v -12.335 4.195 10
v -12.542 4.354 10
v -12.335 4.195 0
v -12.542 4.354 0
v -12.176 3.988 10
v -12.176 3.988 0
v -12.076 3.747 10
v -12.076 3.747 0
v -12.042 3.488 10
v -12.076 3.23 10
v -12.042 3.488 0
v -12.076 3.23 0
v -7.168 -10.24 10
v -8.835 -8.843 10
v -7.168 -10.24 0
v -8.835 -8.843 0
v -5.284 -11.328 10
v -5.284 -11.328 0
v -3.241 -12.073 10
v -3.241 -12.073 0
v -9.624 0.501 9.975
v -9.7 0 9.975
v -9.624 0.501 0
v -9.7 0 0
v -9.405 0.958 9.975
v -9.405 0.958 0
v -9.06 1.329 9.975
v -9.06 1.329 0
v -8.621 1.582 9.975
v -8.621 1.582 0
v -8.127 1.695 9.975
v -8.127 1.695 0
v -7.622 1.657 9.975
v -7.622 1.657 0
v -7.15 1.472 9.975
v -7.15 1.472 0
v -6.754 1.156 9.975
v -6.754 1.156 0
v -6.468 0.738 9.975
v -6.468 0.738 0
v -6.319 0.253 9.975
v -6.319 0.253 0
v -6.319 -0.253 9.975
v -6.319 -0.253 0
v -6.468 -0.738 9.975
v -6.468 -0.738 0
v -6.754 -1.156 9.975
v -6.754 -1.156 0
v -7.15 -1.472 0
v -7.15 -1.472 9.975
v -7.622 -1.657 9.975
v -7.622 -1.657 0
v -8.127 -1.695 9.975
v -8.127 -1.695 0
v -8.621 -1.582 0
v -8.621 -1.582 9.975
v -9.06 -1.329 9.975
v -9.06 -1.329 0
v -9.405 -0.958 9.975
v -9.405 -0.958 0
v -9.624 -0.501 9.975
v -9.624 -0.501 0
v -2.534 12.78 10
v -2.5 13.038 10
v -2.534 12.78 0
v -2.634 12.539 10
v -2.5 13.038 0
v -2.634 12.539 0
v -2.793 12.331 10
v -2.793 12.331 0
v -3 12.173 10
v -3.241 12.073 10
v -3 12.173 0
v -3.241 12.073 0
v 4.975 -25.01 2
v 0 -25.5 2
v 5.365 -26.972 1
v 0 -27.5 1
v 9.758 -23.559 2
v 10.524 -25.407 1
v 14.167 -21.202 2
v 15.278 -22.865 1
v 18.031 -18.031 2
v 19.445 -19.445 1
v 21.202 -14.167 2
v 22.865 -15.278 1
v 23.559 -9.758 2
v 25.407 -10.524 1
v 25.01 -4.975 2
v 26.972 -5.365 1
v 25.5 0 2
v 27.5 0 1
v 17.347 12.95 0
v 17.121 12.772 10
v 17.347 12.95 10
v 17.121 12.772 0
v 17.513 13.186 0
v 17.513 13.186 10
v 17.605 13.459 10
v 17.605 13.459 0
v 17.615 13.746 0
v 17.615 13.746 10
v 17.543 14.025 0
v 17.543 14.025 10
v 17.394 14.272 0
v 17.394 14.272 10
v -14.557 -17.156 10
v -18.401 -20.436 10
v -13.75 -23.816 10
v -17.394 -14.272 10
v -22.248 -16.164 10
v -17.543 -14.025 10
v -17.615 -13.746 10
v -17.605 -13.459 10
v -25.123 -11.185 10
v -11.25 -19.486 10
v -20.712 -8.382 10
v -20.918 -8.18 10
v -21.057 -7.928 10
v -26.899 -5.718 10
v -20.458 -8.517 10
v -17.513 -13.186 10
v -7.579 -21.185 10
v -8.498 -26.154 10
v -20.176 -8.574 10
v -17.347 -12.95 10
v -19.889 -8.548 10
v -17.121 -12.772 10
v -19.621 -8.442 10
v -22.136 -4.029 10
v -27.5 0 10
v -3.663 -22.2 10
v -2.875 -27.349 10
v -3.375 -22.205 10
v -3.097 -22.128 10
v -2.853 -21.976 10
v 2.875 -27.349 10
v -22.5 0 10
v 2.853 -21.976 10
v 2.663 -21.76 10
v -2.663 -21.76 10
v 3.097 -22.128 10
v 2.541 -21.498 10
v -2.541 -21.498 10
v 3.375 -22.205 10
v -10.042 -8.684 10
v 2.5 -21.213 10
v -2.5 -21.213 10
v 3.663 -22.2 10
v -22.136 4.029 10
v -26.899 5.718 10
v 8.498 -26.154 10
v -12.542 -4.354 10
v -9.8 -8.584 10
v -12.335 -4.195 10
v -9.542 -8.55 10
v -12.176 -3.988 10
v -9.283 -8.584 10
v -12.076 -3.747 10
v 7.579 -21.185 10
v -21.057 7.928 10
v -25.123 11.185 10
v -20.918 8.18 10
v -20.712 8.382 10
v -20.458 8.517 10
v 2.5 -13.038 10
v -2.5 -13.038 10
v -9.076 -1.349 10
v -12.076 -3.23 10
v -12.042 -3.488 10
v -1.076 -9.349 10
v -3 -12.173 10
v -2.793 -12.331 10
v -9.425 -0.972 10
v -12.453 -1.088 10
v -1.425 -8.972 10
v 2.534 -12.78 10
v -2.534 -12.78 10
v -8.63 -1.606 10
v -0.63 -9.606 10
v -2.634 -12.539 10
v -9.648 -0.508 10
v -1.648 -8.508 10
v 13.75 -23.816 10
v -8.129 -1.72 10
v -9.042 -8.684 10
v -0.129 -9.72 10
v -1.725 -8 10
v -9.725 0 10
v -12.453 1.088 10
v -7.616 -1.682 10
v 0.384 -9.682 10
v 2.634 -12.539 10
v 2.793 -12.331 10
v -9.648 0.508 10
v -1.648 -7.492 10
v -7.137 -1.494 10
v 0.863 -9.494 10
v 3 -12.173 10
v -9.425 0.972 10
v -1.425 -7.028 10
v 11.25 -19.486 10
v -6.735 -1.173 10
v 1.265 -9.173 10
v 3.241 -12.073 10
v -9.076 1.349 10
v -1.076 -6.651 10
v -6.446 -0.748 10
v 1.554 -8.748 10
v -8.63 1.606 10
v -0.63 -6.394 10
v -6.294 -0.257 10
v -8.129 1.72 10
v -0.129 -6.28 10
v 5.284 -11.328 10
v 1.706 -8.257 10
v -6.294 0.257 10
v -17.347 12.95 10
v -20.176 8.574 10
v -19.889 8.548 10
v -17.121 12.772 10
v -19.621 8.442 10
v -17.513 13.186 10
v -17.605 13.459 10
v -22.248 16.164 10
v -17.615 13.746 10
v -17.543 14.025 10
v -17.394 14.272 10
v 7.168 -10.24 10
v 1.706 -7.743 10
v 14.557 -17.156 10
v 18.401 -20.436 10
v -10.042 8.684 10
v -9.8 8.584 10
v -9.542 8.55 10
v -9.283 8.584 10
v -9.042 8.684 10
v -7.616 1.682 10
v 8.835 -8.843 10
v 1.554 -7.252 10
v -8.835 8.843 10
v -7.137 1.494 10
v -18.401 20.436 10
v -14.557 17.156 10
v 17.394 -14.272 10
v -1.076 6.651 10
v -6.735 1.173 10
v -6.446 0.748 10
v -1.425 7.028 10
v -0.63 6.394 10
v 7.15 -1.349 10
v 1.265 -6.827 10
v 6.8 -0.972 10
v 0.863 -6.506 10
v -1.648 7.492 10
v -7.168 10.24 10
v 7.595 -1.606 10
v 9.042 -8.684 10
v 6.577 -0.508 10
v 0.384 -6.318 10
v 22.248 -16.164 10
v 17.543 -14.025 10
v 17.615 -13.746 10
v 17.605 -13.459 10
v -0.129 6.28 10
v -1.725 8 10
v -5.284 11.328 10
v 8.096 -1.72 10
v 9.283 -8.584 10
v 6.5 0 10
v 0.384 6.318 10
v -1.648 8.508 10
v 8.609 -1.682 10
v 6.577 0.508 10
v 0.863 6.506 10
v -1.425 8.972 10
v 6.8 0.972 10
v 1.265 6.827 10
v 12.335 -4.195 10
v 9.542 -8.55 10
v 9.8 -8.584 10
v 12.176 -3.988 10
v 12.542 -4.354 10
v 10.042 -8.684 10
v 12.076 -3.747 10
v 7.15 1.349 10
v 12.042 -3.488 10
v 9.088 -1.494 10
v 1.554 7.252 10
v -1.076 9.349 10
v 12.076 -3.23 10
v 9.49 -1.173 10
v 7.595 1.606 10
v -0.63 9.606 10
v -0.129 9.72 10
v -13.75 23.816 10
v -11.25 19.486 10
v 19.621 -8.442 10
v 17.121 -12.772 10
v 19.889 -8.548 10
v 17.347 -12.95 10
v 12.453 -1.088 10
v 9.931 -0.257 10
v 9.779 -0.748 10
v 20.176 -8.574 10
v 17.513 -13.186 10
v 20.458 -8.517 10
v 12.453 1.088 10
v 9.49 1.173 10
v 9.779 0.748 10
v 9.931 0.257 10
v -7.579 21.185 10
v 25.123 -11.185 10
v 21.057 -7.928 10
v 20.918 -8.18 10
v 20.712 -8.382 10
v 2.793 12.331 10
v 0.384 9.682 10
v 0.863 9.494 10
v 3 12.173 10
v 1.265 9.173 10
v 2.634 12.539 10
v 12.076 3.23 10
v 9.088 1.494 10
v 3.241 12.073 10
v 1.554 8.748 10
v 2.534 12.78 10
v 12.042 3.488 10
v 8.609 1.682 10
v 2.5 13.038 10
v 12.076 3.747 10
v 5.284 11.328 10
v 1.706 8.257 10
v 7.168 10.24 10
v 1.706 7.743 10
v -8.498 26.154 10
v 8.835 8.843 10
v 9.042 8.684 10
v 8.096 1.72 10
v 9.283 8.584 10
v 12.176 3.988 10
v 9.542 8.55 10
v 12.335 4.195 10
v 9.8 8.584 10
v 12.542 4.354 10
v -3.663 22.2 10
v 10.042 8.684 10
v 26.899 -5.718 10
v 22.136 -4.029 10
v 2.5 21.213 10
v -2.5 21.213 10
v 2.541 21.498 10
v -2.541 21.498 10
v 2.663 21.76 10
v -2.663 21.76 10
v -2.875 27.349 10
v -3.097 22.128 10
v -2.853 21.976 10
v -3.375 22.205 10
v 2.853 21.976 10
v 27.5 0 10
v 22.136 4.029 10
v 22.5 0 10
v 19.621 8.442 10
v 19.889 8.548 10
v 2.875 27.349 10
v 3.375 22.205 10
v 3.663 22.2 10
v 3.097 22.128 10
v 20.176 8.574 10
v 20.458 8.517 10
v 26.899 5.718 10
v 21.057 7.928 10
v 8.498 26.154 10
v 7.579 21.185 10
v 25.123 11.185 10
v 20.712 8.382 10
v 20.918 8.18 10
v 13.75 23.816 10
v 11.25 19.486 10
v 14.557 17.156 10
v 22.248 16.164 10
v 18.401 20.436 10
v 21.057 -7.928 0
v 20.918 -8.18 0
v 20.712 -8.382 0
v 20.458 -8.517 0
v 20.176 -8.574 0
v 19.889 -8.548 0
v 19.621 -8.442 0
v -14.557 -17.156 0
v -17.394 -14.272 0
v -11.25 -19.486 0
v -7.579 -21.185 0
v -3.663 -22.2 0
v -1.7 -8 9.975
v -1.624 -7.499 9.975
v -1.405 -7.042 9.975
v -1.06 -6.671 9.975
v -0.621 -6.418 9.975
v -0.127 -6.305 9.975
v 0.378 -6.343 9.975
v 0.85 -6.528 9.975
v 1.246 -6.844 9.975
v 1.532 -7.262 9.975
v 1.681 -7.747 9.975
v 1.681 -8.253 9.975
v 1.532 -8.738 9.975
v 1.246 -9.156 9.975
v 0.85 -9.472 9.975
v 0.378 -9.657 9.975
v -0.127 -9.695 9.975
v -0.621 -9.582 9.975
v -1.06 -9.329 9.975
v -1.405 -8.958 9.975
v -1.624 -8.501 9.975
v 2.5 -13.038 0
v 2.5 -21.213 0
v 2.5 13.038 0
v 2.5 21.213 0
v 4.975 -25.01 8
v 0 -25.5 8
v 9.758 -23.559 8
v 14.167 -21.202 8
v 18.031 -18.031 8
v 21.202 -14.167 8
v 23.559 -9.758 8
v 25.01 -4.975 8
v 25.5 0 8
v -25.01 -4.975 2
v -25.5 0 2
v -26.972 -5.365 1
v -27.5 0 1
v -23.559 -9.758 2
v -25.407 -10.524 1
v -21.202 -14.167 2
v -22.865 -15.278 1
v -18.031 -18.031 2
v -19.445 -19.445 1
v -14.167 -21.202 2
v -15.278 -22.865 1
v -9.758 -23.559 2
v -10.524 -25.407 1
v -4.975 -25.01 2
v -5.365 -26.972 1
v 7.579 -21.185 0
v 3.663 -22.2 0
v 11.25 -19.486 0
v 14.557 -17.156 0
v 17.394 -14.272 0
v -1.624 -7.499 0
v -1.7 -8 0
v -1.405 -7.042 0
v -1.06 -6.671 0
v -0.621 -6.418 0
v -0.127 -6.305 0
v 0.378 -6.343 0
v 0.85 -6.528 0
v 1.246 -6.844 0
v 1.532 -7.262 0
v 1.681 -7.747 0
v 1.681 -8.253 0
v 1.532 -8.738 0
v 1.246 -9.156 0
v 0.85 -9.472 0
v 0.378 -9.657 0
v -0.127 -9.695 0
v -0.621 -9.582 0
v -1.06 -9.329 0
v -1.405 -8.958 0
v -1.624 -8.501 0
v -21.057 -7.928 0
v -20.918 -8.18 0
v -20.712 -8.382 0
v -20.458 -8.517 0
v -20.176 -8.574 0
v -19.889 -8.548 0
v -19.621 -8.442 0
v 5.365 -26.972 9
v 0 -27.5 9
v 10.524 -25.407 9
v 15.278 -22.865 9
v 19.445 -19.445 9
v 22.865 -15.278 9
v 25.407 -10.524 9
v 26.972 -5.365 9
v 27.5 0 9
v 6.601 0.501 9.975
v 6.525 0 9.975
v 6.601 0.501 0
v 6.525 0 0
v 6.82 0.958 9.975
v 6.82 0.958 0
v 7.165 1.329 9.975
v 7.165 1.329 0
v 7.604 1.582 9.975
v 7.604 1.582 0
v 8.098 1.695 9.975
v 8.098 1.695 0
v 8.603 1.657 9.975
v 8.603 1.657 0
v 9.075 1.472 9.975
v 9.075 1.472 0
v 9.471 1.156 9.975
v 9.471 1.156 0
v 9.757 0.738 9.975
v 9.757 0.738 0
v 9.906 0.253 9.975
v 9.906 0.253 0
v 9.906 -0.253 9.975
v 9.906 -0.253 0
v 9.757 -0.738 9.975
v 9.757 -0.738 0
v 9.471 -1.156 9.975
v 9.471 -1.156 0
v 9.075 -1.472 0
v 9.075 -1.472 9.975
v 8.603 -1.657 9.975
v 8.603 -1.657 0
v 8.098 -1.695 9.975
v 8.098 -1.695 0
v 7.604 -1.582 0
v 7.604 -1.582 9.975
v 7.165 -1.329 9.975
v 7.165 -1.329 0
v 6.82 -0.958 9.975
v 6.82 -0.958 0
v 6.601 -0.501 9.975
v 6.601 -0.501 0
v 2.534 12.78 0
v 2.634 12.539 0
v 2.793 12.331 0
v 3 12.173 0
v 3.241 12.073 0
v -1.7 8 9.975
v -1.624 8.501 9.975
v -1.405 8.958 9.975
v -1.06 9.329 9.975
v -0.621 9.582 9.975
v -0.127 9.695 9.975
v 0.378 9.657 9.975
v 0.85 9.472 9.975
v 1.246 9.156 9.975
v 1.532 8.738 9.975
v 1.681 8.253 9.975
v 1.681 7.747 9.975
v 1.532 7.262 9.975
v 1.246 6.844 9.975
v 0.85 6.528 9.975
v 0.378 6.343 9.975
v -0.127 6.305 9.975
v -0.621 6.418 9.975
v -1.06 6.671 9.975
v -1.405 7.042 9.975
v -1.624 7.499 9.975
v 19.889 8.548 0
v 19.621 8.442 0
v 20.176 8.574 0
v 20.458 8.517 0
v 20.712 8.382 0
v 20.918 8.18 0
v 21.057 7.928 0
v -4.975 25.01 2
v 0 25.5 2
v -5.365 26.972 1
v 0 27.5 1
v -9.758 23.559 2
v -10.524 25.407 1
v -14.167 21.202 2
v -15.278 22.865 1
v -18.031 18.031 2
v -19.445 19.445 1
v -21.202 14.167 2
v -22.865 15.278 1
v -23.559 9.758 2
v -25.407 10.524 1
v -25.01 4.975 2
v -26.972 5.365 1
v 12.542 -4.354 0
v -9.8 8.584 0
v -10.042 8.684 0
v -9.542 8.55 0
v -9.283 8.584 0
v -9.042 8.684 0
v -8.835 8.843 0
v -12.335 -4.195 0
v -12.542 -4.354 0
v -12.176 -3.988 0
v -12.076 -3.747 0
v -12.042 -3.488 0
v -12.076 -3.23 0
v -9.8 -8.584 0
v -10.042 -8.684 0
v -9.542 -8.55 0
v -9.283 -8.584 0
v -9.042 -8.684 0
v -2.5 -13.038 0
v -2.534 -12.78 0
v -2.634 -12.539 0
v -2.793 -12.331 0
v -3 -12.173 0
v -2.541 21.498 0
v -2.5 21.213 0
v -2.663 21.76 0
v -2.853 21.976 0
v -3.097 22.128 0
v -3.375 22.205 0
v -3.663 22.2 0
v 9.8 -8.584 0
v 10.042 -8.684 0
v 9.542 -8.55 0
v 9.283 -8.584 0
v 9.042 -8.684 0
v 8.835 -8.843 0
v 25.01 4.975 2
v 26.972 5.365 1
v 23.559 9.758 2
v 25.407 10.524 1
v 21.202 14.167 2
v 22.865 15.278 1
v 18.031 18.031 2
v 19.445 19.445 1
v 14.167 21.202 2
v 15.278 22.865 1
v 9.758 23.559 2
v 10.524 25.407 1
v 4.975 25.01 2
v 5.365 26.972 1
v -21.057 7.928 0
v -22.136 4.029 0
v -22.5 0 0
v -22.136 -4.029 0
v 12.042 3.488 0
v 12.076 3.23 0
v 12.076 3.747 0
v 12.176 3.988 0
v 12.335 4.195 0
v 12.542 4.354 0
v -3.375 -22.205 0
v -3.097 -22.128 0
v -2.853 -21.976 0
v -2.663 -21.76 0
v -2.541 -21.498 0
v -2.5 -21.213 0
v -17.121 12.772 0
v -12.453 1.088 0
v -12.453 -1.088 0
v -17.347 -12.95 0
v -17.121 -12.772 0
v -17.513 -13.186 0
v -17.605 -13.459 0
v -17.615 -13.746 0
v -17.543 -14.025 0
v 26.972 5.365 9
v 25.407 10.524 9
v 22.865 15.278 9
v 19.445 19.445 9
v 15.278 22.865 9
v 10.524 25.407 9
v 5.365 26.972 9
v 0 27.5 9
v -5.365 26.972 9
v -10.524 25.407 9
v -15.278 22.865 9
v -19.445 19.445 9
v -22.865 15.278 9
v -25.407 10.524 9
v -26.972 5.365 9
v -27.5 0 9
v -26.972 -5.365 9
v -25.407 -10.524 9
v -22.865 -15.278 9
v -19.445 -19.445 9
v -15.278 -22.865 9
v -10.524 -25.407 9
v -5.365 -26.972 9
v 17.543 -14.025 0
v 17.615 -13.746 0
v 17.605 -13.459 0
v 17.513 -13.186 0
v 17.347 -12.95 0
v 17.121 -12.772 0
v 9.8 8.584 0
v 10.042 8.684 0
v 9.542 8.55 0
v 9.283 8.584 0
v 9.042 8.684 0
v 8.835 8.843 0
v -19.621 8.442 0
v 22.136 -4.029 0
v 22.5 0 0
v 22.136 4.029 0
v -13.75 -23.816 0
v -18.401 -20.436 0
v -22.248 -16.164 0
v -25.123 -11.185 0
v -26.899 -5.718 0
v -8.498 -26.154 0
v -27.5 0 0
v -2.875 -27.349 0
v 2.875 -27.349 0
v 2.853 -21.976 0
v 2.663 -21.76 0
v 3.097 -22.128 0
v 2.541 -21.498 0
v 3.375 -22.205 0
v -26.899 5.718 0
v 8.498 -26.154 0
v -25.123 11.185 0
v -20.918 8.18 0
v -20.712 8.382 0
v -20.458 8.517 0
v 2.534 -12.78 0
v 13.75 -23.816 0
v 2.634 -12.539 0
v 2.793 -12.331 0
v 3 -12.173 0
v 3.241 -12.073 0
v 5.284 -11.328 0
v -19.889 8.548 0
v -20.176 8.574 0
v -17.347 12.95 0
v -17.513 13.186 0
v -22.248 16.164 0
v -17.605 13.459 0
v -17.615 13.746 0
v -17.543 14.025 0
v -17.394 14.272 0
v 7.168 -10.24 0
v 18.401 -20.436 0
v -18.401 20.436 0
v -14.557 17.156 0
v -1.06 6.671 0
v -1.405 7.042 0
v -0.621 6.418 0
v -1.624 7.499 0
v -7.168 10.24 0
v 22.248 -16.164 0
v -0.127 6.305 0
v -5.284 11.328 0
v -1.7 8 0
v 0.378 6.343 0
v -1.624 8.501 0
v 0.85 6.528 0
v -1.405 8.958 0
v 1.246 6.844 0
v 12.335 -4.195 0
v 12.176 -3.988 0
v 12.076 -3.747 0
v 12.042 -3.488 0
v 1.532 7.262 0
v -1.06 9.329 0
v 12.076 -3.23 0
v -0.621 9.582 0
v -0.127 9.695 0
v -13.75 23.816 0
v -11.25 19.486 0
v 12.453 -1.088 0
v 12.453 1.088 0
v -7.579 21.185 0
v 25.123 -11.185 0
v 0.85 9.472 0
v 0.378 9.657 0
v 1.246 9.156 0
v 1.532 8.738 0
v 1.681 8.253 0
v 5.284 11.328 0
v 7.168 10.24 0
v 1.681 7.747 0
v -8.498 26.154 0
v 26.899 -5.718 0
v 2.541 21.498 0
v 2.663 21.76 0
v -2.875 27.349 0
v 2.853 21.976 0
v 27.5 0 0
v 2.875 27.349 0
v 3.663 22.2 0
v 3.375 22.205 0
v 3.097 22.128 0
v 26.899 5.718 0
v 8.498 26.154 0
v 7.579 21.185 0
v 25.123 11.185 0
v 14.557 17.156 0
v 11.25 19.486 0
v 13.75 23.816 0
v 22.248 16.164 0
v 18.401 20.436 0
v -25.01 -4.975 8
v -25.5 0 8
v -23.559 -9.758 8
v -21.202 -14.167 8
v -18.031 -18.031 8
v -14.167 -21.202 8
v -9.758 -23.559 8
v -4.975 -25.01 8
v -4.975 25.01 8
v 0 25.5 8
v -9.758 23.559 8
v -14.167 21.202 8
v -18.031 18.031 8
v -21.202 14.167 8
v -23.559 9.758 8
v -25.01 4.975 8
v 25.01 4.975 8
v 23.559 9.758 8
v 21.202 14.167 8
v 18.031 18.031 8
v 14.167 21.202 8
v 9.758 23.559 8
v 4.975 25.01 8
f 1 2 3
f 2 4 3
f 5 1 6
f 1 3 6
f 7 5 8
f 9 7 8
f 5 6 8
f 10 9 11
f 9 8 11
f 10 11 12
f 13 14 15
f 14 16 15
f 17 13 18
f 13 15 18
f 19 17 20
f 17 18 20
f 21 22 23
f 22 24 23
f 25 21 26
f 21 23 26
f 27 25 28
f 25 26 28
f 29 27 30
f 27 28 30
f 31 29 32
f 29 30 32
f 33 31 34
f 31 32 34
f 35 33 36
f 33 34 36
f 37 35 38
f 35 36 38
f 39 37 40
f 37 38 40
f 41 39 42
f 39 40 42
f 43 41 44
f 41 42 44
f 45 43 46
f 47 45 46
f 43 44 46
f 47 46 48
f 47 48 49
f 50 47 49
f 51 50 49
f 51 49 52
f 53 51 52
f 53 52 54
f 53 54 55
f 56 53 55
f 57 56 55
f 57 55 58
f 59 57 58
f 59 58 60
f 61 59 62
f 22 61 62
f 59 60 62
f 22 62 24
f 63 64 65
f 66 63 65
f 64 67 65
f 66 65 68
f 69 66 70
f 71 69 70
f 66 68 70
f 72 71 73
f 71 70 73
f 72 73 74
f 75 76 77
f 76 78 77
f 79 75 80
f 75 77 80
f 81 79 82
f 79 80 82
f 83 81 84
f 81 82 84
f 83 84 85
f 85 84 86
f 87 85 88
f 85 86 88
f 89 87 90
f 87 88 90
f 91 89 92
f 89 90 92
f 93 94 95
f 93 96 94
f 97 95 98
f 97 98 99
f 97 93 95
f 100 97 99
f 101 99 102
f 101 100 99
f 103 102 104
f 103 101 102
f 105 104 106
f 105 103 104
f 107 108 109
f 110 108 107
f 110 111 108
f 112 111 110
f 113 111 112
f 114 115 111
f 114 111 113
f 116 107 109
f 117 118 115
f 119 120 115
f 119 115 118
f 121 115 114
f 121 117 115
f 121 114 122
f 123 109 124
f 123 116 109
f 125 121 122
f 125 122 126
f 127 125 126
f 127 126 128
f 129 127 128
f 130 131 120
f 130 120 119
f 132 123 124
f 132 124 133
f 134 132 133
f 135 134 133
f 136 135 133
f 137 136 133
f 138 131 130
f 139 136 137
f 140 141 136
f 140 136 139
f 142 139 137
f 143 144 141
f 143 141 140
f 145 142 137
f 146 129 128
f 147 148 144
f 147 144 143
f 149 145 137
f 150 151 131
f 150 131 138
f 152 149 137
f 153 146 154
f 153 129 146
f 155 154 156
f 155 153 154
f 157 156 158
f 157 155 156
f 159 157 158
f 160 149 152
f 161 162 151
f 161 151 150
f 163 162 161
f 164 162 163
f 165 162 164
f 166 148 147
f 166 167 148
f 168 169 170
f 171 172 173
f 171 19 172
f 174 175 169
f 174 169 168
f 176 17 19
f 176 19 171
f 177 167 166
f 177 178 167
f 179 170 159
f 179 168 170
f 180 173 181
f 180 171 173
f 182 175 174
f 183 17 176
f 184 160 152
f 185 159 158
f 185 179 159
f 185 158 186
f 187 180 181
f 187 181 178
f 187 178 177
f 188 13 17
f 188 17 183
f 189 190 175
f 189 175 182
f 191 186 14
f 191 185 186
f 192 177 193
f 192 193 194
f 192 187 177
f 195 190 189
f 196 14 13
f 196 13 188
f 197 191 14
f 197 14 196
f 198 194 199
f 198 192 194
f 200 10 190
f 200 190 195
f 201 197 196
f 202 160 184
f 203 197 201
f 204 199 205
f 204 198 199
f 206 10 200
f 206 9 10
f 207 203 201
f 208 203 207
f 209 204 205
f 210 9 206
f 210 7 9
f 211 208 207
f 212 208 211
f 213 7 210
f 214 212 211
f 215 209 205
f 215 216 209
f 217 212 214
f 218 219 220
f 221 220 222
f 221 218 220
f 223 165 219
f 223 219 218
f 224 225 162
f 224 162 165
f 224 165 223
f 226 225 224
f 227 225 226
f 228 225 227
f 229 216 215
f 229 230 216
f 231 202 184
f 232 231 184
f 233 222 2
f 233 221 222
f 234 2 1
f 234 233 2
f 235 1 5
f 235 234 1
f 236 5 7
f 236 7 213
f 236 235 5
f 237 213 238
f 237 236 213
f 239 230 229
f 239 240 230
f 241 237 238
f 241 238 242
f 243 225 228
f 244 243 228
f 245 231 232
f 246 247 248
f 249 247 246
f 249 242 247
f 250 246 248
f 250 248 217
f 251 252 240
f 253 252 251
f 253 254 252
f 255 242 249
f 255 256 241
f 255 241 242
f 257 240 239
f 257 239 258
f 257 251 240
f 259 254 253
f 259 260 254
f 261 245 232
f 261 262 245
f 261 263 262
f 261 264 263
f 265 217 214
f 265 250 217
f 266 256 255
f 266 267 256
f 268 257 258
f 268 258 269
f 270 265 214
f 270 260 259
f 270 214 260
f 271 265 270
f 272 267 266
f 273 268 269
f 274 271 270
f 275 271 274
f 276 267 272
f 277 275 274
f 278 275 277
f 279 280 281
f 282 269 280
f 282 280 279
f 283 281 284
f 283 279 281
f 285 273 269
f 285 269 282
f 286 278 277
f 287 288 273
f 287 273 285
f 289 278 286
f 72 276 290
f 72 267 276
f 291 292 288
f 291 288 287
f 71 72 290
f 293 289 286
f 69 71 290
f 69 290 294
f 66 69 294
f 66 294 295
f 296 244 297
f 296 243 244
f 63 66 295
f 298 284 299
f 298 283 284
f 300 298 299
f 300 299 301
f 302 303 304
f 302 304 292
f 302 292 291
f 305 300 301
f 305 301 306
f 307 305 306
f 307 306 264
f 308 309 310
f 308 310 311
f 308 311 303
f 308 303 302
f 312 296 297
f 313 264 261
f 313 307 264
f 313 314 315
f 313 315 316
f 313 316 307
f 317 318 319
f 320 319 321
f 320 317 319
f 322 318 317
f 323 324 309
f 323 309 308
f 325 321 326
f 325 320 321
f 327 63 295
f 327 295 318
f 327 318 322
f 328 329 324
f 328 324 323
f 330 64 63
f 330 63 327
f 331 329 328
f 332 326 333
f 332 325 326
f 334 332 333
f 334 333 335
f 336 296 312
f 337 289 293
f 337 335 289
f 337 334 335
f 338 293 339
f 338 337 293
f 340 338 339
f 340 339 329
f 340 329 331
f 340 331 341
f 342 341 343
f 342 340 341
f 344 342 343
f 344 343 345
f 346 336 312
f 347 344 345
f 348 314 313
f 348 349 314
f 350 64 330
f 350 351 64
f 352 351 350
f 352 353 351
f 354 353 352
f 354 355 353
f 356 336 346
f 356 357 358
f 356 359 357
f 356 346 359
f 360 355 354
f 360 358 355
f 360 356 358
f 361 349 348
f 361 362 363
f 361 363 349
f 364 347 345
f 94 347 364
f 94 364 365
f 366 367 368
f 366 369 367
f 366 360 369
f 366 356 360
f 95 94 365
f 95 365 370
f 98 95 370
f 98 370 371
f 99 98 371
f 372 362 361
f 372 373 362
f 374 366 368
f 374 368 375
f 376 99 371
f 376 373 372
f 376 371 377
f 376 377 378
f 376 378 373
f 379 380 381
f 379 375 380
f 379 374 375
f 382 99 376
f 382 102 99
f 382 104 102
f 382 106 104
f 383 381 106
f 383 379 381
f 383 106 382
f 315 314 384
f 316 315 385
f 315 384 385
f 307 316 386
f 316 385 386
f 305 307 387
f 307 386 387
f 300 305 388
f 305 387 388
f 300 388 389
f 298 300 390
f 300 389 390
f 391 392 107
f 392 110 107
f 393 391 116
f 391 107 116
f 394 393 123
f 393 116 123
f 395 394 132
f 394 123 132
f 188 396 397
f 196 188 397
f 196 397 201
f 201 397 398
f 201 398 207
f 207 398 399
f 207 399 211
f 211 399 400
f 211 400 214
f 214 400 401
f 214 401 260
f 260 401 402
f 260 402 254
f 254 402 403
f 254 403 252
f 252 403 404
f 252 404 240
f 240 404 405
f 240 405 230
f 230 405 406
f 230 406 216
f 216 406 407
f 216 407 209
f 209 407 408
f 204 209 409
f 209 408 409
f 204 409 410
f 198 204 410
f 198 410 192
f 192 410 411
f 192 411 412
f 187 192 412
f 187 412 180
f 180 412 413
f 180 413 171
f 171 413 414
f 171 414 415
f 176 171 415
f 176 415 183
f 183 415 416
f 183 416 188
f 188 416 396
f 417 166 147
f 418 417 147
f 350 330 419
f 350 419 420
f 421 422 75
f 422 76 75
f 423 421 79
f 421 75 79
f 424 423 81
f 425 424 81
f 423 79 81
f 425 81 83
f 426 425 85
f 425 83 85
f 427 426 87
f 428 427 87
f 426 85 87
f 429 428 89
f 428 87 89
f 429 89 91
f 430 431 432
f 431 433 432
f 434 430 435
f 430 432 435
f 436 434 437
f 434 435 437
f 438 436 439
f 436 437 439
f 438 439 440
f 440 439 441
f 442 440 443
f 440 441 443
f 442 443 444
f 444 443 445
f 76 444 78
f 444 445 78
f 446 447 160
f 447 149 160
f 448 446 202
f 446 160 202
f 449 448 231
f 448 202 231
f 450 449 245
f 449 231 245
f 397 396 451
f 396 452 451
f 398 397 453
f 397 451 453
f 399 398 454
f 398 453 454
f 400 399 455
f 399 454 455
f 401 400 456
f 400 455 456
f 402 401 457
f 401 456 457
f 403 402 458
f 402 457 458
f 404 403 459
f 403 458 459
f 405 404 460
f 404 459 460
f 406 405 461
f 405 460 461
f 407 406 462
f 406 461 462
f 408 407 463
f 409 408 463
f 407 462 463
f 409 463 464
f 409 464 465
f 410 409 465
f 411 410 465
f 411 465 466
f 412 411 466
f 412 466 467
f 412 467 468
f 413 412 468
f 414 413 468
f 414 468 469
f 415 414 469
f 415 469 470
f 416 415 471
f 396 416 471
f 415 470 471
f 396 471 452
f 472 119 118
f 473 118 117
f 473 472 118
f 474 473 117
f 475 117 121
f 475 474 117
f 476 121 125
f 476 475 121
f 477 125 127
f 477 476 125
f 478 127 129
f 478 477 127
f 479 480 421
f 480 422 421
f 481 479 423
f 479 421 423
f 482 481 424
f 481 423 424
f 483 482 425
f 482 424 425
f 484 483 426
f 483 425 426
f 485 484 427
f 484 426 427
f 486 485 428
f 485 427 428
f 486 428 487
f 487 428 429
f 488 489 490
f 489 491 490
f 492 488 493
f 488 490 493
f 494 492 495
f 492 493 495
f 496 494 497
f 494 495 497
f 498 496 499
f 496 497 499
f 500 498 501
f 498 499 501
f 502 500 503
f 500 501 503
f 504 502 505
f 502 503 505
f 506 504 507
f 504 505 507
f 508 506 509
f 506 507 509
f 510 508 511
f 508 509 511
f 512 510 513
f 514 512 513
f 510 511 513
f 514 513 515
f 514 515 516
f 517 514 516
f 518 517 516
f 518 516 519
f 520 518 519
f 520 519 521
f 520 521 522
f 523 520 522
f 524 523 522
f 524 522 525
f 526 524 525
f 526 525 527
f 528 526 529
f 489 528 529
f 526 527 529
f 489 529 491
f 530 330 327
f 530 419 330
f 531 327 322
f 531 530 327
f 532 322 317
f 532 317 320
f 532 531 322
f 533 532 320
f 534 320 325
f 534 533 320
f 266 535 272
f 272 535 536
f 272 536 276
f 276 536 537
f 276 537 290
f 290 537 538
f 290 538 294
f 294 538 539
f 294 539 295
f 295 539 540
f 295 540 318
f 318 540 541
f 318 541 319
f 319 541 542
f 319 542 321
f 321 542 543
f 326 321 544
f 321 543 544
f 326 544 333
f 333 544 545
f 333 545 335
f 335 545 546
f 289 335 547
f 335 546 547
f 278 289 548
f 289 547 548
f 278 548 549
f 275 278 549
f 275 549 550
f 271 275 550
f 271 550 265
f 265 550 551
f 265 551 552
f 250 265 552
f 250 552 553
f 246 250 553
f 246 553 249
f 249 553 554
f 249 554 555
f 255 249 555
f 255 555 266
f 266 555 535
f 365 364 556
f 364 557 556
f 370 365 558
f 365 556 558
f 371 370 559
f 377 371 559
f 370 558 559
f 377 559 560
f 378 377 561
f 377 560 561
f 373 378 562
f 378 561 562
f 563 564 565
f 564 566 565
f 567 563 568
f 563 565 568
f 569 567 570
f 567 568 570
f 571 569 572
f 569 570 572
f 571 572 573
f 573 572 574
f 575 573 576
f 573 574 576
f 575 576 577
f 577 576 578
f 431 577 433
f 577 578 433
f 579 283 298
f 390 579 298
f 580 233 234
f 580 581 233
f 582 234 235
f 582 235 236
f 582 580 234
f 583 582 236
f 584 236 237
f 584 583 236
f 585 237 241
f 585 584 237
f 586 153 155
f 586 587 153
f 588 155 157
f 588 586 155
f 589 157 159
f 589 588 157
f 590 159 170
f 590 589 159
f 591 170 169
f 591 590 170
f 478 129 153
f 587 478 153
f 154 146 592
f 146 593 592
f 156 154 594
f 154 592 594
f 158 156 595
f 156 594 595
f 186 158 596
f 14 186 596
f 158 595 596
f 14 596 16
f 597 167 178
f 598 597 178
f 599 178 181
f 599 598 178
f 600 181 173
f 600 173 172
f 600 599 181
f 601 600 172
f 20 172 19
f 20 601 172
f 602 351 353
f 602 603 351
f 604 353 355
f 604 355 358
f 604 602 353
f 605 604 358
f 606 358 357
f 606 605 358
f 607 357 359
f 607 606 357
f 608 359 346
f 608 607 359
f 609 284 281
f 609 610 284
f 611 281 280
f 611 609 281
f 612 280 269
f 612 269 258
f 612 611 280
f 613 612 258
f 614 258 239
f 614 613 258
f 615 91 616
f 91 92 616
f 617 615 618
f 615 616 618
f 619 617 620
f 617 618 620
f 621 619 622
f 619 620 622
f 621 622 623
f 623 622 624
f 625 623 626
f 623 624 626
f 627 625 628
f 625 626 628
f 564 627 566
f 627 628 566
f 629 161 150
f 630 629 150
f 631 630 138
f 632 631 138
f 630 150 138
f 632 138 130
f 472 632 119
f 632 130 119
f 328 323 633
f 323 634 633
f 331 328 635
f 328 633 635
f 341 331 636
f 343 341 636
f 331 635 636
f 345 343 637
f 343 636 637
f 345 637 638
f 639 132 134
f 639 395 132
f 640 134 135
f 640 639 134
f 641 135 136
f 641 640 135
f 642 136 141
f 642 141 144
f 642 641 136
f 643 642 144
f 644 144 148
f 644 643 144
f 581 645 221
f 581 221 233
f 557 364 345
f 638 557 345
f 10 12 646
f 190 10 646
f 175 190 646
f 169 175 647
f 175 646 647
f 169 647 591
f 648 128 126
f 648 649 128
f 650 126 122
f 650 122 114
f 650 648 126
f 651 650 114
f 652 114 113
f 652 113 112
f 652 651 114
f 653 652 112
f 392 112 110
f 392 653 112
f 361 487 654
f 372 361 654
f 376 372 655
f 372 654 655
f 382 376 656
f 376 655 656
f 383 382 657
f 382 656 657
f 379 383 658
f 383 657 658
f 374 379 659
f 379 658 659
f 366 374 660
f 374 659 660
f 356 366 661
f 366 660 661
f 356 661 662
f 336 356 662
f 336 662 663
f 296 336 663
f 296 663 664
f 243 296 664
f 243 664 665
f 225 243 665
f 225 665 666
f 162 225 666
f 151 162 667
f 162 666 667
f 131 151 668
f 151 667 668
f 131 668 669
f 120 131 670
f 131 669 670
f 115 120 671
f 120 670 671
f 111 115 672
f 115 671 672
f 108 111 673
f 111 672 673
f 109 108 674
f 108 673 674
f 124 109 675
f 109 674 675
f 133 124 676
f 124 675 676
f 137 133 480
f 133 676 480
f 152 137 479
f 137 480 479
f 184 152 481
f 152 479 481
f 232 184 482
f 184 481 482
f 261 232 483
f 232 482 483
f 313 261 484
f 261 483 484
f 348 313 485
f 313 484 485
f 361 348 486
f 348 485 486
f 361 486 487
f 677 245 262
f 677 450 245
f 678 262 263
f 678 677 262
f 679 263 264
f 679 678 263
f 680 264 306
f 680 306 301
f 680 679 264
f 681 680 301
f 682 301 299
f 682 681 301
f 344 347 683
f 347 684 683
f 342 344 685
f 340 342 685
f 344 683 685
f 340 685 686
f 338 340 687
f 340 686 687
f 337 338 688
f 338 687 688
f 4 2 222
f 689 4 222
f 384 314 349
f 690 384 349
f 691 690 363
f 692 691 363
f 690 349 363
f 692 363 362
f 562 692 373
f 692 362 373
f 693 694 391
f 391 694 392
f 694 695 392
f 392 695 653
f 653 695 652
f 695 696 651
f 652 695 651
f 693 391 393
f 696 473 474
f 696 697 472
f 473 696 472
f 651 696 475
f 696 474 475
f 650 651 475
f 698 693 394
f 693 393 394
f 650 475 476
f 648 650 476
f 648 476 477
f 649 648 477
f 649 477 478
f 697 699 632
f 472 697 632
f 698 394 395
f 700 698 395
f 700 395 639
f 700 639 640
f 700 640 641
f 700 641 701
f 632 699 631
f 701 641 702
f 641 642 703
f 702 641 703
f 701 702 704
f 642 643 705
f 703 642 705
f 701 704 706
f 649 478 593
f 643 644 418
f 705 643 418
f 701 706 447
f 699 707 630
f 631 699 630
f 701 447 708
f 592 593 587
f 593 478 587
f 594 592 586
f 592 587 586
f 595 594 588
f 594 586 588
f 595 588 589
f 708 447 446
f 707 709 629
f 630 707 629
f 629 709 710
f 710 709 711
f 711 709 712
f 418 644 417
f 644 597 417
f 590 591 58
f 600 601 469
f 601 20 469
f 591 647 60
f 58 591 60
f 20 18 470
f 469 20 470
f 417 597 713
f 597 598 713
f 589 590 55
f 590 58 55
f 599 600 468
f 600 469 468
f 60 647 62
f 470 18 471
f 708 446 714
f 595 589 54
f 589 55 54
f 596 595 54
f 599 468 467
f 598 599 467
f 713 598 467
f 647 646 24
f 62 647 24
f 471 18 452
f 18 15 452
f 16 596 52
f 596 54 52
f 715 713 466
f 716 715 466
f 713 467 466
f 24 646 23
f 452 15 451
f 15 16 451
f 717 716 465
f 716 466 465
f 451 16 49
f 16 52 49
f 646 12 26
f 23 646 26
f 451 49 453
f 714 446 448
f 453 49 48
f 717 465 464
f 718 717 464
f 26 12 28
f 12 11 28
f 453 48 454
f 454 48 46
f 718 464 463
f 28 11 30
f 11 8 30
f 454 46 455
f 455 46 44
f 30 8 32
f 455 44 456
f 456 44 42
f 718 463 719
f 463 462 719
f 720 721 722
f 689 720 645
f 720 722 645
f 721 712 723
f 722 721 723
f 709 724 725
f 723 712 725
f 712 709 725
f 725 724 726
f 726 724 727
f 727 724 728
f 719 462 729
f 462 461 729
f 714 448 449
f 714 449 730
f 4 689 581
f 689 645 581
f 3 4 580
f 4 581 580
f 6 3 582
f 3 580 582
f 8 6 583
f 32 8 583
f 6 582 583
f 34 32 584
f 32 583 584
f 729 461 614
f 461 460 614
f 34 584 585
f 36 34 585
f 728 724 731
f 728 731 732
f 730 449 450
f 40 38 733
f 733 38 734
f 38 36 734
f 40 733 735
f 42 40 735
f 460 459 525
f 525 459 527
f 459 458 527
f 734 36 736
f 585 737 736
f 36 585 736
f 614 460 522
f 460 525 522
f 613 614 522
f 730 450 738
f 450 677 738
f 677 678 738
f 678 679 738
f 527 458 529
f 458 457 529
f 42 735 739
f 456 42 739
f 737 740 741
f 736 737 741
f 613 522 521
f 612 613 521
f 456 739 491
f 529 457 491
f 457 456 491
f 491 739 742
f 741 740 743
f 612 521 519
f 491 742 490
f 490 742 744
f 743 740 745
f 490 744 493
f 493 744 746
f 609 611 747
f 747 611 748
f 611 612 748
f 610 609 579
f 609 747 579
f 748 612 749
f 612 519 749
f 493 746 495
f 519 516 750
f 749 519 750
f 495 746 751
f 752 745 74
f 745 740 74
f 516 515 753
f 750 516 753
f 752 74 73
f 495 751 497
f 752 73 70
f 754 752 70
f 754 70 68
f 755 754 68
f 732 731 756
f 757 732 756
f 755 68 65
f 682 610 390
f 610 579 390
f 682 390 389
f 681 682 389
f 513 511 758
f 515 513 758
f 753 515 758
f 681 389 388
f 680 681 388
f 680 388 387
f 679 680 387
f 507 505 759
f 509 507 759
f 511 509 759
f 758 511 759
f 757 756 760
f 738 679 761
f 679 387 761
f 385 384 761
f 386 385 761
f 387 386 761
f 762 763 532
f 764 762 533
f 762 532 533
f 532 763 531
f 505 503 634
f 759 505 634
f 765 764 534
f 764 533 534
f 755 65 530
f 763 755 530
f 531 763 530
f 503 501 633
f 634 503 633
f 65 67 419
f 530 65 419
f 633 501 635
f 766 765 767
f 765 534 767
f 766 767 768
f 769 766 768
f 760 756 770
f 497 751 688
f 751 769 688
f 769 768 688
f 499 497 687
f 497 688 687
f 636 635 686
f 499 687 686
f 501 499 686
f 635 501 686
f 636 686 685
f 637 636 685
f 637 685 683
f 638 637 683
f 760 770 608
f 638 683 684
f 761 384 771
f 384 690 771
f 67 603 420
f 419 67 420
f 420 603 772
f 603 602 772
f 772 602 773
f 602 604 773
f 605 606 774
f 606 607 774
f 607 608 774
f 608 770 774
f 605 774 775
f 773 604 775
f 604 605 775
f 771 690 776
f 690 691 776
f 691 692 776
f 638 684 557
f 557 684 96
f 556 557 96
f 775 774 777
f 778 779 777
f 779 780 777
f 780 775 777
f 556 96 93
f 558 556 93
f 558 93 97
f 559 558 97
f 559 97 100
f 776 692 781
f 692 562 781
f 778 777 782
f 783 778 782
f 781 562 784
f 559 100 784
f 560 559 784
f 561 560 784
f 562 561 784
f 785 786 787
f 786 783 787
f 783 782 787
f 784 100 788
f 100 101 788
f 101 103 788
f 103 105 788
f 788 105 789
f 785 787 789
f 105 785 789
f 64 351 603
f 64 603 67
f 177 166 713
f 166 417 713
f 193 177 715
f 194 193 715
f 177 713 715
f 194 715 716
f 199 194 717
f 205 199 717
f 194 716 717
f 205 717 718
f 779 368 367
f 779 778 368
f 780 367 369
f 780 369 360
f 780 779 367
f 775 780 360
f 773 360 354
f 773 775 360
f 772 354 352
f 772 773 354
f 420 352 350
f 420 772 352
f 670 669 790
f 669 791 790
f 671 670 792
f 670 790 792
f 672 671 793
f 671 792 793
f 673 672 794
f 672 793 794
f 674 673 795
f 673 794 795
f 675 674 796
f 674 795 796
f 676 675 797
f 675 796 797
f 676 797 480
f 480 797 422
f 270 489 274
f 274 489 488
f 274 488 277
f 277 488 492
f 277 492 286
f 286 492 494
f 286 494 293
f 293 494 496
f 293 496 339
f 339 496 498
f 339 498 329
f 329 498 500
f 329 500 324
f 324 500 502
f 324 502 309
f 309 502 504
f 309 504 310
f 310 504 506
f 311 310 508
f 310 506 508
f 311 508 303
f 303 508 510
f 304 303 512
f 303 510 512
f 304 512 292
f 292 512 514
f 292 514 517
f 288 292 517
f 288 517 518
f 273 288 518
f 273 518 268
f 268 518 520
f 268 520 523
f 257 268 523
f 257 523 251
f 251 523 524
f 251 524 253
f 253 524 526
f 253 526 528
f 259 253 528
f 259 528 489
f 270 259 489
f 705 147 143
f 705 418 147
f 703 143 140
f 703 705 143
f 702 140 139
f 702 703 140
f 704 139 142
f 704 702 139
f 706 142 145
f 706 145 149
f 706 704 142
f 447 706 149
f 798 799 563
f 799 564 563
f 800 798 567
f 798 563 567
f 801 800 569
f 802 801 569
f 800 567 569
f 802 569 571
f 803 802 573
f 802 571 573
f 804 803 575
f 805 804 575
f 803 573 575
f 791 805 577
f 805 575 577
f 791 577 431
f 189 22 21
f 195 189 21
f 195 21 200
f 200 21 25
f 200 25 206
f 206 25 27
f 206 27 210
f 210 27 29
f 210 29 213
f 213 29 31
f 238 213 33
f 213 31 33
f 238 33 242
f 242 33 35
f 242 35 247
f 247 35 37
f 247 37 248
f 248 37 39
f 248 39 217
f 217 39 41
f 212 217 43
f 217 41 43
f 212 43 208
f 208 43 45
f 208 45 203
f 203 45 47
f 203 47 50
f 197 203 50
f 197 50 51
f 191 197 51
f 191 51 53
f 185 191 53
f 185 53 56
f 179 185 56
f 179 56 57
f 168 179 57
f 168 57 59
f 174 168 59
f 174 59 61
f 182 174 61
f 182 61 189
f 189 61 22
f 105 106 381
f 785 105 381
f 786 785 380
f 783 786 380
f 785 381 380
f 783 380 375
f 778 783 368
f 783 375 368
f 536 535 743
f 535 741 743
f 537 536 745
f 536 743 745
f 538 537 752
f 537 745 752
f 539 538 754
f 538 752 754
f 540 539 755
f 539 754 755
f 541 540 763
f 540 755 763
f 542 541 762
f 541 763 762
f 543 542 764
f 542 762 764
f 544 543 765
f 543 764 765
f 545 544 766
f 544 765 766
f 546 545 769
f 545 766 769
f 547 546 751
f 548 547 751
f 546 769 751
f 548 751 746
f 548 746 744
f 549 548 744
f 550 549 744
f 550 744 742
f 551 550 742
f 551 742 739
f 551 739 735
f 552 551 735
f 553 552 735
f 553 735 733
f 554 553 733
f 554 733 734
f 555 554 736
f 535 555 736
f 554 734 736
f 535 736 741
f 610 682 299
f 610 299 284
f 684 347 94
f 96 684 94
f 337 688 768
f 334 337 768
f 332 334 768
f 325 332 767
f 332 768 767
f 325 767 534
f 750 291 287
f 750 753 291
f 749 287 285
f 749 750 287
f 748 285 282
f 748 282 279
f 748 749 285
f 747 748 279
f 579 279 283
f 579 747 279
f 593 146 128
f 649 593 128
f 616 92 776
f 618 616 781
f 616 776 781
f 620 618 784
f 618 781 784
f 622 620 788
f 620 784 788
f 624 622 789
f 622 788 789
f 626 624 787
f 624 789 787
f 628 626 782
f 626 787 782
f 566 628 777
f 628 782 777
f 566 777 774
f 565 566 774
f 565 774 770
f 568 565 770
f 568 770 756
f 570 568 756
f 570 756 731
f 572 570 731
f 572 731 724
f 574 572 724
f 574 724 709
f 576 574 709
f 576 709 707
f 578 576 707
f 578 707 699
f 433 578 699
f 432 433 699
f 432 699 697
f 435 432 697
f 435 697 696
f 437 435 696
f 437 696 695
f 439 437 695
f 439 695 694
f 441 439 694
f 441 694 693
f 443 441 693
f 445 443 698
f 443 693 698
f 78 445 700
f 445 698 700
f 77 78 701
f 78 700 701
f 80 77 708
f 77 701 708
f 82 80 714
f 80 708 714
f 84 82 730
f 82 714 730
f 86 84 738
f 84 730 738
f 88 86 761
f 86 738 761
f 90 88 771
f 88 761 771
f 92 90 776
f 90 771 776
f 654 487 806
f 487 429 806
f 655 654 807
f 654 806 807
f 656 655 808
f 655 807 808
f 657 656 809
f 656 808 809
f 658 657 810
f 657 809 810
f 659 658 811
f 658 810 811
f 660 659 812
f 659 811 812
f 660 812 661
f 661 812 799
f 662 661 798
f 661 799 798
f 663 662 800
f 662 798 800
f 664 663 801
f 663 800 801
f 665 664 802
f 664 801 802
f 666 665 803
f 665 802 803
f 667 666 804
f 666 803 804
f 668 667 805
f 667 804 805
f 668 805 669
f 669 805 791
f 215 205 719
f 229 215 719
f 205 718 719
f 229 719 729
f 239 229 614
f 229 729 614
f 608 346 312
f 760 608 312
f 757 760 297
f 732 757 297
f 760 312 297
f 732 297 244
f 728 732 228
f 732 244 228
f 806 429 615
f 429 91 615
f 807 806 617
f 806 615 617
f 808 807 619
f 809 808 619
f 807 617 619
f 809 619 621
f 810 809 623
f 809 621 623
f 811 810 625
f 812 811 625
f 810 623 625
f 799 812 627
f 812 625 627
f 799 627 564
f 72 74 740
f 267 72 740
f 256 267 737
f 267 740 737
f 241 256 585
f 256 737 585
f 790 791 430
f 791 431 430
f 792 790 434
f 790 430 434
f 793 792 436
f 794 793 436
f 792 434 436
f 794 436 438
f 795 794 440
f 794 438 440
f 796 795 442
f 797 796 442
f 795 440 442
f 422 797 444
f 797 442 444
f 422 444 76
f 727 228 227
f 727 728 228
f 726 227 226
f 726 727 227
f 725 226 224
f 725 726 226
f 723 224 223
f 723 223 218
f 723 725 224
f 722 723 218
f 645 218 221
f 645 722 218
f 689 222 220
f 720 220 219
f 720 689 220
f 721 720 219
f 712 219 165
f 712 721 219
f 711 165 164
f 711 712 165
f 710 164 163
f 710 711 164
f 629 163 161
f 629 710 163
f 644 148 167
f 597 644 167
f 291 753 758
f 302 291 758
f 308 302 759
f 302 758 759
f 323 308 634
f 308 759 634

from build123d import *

# Parameters (mm, degrees)
SKETCH_1_R                  = 27.5
EXTRUDE_1_DEPTH             = 10
CUT_EXTRUDE_1_REACH         = 42.156
SKETCH_2_R                  = 22.5
SKETCH_3_R                  = 12.5
EXTRUDE_2_DEPTH             = 10
EXTRUDE_START               = 10
EXTRUDE_3_DEPTH             = 10
HOLE_WIZARD_M32_D           = 3.4
HOLE_WIZARD_M32_CSINK_D     = 3.45
HOLE_WIZARD_M32_CSINK_ANGLE = 90
FILLET_1_R                  = 1


with BuildPart() as part:
    # Эскиз1 → Бобышка-Вытянуть1 (new body)
    with BuildSketch(Plane.XY):
        Circle(SKETCH_1_R)
    extrude(amount=EXTRUDE_1_DEPTH)

    # Эскиз2 → Вырез-Вытянуть1 (cut, up to next)
    with BuildSketch(Plane.XY.offset(10), mode=Mode.PRIVATE) as cut_extrude_1_sk1:
        Circle(SKETCH_2_R)
    cut_extrude_1_tool1 = extrude(cut_extrude_1_sk1.sketch, amount=-CUT_EXTRUDE_1_REACH, mode=Mode.PRIVATE) & part.part
    add(cut_extrude_1_tool1.solids().sort_by_distance((0, 0, 10))[0], mode=Mode.SUBTRACT)



with BuildPart() as body_2:
    # Эскиз3 → Бобышка-Вытянуть2 (new body)
    with BuildSketch(Plane.XY):
        Circle(SKETCH_3_R)
    extrude(amount=EXTRUDE_2_DEPTH)


with BuildPart() as part_1:
    add(part.part)

    add(body_2.part)  # Бобышка-Вытянуть3 merges body 2
    # Эскиз5 → Бобышка-Вытянуть3 (add)
    with BuildSketch(Plane.XY.offset(EXTRUDE_START)):
        with BuildLine():
            Line((9.356601718, 8.288787866), (18.114916731, 13.345403397))
            ThreePointArc((18.114916731, 13.345403397), (19.485571585, 11.25), (20.614916731, 9.015276378))
            Line((20.614916731, 9.015276378), (11.856601718, 3.958660847))
            ThreePointArc((11.856601718, 3.958660847), (10.825317547, 6.25), (9.356601718, 8.288787866))
        make_face()
        with BuildLine():
            Line((2.5, 12.247448714), (2.5, 22.360679775))
            ThreePointArc((2.5, 22.360679775), (0, 22.5), (-2.5, 22.360679775))
            Line((-2.5, 22.360679775), (-2.5, 12.247448714))
            ThreePointArc((-2.5, 12.247448714), (0, 12.5), (2.5, 12.247448714))
        make_face()
        with BuildLine():
            Line((11.856601718, -3.958660847), (20.614916731, -9.015276378))
            ThreePointArc((20.614916731, -9.015276378), (19.485571585, -11.25), (18.114916731, -13.345403397))
            Line((18.114916731, -13.345403397), (9.356601718, -8.288787866))
            ThreePointArc((9.356601718, -8.288787866), (10.825317547, -6.25), (11.856601718, -3.958660847))
        make_face()
        with BuildLine():
            Line((2.5, -12.247448714), (2.5, -22.360679775))
            ThreePointArc((2.5, -22.360679775), (0, -22.5), (-2.5, -22.360679775))
            Line((-2.5, -22.360679775), (-2.5, -12.247448714))
            ThreePointArc((-2.5, -12.247448714), (0, -12.5), (2.5, -12.247448714))
        make_face()
        with BuildLine():
            Line((-9.356601718, -8.288787866), (-18.114916731, -13.345403397))
            ThreePointArc((-18.114916731, -13.345403397), (-19.485571585, -11.25), (-20.614916731, -9.015276378))
            Line((-20.614916731, -9.015276378), (-11.856601718, -3.958660847))
            ThreePointArc((-11.856601718, -3.958660847), (-10.825317547, -6.25), (-9.356601718, -8.288787866))
        make_face()
        with BuildLine():
            Line((-11.856601718, 3.958660847), (-20.614916731, 9.015276378))
            ThreePointArc((-20.614916731, 9.015276378), (-19.485571585, 11.25), (-18.114916731, 13.345403397))
            Line((-18.114916731, 13.345403397), (-9.356601718, 8.288787866))
            ThreePointArc((-9.356601718, 8.288787866), (-10.825317547, 6.25), (-11.856601718, 3.958660847))
        make_face()
    extrude(amount=-EXTRUDE_3_DEPTH)

    # Отверстие с зазором M32 (through all)
    with Locations(Plane.XY.offset(10)):
        with Locations((-8, 0), (0, 8), (8.225054206, 0), (0, -8)):
            CounterSinkHole(HOLE_WIZARD_M32_D / 2, HOLE_WIZARD_M32_CSINK_D / 2, counter_sink_angle=HOLE_WIZARD_M32_CSINK_ANGLE)

    # Скругление1
    fillet_1_edges = [part_1.edges().sort_by_distance(p)[0] for p in [
        (-2.5, 12.247448714, 5),
        (2.5, 12.247448714, 5),
        (2.5, 22.360679775, 5),
        (-2.5, 22.360679775, 5),
        (9.356601718, 8.288787866, 5),
        (11.856601718, 3.958660847, 5),
        (20.614916731, 9.015276378, 5),
        (18.114916731, 13.345403397, 5),
        (11.856601718, -3.958660847, 5),
        (9.356601718, -8.288787866, 5),
        (18.114916731, -13.345403397, 5),
        (20.614916731, -9.015276378, 5),
        (2.5, -12.247448714, 5),
        (-2.5, -12.247448714, 5),
        (-2.5, -22.360679775, 5),
        (2.5, -22.360679775, 5),
        (-9.356601718, -8.288787866, 5),
        (-11.856601718, -3.958660847, 5),
        (-20.614916731, -9.015276378, 5),
        (-18.114916731, -13.345403397, 5),
        (-11.856601718, 3.958660847, 5),
        (-9.356601718, 8.288787866, 5),
        (-18.114916731, 13.345403397, 5),
        (-20.614916731, 9.015276378, 5),
    ]]
    fillet(fillet_1_edges, radius=FILLET_1_R)

    # Вырез-По траектории2: sweep along a curve in space
    with BuildLine() as sweep_2_path:
        ThreePointArc((27.5, 0, 10), (19.445436483, 19.445436483, 10), (0, 27.5, 10))
        ThreePointArc((0, 27.5, 10), (-19.445436483, 19.445436483, 10), (-27.5, 0, 10))
        ThreePointArc((-27.5, 0, 10), (-19.445436483, -19.445436483, 10), (0, -27.5, 10))
        ThreePointArc((0, -27.5, 10), (19.445436483, -19.445436483, 10), (27.5, 0, 10))
    # Эскиз13 → Вырез-По траектории2 (sweep, cut)
    with BuildSketch(Plane(origin=(0, 0, 0), x_dir=(0, 0, -1), z_dir=(1, 0, 0))):
        Polygon((-8, 25.5), (-2, 25.5), (-1, 27.5), (-9, 27.5), align=None)
    sweep(path=sweep_2_path.line, mode=Mode.SUBTRACT)


solid = part_1.part
